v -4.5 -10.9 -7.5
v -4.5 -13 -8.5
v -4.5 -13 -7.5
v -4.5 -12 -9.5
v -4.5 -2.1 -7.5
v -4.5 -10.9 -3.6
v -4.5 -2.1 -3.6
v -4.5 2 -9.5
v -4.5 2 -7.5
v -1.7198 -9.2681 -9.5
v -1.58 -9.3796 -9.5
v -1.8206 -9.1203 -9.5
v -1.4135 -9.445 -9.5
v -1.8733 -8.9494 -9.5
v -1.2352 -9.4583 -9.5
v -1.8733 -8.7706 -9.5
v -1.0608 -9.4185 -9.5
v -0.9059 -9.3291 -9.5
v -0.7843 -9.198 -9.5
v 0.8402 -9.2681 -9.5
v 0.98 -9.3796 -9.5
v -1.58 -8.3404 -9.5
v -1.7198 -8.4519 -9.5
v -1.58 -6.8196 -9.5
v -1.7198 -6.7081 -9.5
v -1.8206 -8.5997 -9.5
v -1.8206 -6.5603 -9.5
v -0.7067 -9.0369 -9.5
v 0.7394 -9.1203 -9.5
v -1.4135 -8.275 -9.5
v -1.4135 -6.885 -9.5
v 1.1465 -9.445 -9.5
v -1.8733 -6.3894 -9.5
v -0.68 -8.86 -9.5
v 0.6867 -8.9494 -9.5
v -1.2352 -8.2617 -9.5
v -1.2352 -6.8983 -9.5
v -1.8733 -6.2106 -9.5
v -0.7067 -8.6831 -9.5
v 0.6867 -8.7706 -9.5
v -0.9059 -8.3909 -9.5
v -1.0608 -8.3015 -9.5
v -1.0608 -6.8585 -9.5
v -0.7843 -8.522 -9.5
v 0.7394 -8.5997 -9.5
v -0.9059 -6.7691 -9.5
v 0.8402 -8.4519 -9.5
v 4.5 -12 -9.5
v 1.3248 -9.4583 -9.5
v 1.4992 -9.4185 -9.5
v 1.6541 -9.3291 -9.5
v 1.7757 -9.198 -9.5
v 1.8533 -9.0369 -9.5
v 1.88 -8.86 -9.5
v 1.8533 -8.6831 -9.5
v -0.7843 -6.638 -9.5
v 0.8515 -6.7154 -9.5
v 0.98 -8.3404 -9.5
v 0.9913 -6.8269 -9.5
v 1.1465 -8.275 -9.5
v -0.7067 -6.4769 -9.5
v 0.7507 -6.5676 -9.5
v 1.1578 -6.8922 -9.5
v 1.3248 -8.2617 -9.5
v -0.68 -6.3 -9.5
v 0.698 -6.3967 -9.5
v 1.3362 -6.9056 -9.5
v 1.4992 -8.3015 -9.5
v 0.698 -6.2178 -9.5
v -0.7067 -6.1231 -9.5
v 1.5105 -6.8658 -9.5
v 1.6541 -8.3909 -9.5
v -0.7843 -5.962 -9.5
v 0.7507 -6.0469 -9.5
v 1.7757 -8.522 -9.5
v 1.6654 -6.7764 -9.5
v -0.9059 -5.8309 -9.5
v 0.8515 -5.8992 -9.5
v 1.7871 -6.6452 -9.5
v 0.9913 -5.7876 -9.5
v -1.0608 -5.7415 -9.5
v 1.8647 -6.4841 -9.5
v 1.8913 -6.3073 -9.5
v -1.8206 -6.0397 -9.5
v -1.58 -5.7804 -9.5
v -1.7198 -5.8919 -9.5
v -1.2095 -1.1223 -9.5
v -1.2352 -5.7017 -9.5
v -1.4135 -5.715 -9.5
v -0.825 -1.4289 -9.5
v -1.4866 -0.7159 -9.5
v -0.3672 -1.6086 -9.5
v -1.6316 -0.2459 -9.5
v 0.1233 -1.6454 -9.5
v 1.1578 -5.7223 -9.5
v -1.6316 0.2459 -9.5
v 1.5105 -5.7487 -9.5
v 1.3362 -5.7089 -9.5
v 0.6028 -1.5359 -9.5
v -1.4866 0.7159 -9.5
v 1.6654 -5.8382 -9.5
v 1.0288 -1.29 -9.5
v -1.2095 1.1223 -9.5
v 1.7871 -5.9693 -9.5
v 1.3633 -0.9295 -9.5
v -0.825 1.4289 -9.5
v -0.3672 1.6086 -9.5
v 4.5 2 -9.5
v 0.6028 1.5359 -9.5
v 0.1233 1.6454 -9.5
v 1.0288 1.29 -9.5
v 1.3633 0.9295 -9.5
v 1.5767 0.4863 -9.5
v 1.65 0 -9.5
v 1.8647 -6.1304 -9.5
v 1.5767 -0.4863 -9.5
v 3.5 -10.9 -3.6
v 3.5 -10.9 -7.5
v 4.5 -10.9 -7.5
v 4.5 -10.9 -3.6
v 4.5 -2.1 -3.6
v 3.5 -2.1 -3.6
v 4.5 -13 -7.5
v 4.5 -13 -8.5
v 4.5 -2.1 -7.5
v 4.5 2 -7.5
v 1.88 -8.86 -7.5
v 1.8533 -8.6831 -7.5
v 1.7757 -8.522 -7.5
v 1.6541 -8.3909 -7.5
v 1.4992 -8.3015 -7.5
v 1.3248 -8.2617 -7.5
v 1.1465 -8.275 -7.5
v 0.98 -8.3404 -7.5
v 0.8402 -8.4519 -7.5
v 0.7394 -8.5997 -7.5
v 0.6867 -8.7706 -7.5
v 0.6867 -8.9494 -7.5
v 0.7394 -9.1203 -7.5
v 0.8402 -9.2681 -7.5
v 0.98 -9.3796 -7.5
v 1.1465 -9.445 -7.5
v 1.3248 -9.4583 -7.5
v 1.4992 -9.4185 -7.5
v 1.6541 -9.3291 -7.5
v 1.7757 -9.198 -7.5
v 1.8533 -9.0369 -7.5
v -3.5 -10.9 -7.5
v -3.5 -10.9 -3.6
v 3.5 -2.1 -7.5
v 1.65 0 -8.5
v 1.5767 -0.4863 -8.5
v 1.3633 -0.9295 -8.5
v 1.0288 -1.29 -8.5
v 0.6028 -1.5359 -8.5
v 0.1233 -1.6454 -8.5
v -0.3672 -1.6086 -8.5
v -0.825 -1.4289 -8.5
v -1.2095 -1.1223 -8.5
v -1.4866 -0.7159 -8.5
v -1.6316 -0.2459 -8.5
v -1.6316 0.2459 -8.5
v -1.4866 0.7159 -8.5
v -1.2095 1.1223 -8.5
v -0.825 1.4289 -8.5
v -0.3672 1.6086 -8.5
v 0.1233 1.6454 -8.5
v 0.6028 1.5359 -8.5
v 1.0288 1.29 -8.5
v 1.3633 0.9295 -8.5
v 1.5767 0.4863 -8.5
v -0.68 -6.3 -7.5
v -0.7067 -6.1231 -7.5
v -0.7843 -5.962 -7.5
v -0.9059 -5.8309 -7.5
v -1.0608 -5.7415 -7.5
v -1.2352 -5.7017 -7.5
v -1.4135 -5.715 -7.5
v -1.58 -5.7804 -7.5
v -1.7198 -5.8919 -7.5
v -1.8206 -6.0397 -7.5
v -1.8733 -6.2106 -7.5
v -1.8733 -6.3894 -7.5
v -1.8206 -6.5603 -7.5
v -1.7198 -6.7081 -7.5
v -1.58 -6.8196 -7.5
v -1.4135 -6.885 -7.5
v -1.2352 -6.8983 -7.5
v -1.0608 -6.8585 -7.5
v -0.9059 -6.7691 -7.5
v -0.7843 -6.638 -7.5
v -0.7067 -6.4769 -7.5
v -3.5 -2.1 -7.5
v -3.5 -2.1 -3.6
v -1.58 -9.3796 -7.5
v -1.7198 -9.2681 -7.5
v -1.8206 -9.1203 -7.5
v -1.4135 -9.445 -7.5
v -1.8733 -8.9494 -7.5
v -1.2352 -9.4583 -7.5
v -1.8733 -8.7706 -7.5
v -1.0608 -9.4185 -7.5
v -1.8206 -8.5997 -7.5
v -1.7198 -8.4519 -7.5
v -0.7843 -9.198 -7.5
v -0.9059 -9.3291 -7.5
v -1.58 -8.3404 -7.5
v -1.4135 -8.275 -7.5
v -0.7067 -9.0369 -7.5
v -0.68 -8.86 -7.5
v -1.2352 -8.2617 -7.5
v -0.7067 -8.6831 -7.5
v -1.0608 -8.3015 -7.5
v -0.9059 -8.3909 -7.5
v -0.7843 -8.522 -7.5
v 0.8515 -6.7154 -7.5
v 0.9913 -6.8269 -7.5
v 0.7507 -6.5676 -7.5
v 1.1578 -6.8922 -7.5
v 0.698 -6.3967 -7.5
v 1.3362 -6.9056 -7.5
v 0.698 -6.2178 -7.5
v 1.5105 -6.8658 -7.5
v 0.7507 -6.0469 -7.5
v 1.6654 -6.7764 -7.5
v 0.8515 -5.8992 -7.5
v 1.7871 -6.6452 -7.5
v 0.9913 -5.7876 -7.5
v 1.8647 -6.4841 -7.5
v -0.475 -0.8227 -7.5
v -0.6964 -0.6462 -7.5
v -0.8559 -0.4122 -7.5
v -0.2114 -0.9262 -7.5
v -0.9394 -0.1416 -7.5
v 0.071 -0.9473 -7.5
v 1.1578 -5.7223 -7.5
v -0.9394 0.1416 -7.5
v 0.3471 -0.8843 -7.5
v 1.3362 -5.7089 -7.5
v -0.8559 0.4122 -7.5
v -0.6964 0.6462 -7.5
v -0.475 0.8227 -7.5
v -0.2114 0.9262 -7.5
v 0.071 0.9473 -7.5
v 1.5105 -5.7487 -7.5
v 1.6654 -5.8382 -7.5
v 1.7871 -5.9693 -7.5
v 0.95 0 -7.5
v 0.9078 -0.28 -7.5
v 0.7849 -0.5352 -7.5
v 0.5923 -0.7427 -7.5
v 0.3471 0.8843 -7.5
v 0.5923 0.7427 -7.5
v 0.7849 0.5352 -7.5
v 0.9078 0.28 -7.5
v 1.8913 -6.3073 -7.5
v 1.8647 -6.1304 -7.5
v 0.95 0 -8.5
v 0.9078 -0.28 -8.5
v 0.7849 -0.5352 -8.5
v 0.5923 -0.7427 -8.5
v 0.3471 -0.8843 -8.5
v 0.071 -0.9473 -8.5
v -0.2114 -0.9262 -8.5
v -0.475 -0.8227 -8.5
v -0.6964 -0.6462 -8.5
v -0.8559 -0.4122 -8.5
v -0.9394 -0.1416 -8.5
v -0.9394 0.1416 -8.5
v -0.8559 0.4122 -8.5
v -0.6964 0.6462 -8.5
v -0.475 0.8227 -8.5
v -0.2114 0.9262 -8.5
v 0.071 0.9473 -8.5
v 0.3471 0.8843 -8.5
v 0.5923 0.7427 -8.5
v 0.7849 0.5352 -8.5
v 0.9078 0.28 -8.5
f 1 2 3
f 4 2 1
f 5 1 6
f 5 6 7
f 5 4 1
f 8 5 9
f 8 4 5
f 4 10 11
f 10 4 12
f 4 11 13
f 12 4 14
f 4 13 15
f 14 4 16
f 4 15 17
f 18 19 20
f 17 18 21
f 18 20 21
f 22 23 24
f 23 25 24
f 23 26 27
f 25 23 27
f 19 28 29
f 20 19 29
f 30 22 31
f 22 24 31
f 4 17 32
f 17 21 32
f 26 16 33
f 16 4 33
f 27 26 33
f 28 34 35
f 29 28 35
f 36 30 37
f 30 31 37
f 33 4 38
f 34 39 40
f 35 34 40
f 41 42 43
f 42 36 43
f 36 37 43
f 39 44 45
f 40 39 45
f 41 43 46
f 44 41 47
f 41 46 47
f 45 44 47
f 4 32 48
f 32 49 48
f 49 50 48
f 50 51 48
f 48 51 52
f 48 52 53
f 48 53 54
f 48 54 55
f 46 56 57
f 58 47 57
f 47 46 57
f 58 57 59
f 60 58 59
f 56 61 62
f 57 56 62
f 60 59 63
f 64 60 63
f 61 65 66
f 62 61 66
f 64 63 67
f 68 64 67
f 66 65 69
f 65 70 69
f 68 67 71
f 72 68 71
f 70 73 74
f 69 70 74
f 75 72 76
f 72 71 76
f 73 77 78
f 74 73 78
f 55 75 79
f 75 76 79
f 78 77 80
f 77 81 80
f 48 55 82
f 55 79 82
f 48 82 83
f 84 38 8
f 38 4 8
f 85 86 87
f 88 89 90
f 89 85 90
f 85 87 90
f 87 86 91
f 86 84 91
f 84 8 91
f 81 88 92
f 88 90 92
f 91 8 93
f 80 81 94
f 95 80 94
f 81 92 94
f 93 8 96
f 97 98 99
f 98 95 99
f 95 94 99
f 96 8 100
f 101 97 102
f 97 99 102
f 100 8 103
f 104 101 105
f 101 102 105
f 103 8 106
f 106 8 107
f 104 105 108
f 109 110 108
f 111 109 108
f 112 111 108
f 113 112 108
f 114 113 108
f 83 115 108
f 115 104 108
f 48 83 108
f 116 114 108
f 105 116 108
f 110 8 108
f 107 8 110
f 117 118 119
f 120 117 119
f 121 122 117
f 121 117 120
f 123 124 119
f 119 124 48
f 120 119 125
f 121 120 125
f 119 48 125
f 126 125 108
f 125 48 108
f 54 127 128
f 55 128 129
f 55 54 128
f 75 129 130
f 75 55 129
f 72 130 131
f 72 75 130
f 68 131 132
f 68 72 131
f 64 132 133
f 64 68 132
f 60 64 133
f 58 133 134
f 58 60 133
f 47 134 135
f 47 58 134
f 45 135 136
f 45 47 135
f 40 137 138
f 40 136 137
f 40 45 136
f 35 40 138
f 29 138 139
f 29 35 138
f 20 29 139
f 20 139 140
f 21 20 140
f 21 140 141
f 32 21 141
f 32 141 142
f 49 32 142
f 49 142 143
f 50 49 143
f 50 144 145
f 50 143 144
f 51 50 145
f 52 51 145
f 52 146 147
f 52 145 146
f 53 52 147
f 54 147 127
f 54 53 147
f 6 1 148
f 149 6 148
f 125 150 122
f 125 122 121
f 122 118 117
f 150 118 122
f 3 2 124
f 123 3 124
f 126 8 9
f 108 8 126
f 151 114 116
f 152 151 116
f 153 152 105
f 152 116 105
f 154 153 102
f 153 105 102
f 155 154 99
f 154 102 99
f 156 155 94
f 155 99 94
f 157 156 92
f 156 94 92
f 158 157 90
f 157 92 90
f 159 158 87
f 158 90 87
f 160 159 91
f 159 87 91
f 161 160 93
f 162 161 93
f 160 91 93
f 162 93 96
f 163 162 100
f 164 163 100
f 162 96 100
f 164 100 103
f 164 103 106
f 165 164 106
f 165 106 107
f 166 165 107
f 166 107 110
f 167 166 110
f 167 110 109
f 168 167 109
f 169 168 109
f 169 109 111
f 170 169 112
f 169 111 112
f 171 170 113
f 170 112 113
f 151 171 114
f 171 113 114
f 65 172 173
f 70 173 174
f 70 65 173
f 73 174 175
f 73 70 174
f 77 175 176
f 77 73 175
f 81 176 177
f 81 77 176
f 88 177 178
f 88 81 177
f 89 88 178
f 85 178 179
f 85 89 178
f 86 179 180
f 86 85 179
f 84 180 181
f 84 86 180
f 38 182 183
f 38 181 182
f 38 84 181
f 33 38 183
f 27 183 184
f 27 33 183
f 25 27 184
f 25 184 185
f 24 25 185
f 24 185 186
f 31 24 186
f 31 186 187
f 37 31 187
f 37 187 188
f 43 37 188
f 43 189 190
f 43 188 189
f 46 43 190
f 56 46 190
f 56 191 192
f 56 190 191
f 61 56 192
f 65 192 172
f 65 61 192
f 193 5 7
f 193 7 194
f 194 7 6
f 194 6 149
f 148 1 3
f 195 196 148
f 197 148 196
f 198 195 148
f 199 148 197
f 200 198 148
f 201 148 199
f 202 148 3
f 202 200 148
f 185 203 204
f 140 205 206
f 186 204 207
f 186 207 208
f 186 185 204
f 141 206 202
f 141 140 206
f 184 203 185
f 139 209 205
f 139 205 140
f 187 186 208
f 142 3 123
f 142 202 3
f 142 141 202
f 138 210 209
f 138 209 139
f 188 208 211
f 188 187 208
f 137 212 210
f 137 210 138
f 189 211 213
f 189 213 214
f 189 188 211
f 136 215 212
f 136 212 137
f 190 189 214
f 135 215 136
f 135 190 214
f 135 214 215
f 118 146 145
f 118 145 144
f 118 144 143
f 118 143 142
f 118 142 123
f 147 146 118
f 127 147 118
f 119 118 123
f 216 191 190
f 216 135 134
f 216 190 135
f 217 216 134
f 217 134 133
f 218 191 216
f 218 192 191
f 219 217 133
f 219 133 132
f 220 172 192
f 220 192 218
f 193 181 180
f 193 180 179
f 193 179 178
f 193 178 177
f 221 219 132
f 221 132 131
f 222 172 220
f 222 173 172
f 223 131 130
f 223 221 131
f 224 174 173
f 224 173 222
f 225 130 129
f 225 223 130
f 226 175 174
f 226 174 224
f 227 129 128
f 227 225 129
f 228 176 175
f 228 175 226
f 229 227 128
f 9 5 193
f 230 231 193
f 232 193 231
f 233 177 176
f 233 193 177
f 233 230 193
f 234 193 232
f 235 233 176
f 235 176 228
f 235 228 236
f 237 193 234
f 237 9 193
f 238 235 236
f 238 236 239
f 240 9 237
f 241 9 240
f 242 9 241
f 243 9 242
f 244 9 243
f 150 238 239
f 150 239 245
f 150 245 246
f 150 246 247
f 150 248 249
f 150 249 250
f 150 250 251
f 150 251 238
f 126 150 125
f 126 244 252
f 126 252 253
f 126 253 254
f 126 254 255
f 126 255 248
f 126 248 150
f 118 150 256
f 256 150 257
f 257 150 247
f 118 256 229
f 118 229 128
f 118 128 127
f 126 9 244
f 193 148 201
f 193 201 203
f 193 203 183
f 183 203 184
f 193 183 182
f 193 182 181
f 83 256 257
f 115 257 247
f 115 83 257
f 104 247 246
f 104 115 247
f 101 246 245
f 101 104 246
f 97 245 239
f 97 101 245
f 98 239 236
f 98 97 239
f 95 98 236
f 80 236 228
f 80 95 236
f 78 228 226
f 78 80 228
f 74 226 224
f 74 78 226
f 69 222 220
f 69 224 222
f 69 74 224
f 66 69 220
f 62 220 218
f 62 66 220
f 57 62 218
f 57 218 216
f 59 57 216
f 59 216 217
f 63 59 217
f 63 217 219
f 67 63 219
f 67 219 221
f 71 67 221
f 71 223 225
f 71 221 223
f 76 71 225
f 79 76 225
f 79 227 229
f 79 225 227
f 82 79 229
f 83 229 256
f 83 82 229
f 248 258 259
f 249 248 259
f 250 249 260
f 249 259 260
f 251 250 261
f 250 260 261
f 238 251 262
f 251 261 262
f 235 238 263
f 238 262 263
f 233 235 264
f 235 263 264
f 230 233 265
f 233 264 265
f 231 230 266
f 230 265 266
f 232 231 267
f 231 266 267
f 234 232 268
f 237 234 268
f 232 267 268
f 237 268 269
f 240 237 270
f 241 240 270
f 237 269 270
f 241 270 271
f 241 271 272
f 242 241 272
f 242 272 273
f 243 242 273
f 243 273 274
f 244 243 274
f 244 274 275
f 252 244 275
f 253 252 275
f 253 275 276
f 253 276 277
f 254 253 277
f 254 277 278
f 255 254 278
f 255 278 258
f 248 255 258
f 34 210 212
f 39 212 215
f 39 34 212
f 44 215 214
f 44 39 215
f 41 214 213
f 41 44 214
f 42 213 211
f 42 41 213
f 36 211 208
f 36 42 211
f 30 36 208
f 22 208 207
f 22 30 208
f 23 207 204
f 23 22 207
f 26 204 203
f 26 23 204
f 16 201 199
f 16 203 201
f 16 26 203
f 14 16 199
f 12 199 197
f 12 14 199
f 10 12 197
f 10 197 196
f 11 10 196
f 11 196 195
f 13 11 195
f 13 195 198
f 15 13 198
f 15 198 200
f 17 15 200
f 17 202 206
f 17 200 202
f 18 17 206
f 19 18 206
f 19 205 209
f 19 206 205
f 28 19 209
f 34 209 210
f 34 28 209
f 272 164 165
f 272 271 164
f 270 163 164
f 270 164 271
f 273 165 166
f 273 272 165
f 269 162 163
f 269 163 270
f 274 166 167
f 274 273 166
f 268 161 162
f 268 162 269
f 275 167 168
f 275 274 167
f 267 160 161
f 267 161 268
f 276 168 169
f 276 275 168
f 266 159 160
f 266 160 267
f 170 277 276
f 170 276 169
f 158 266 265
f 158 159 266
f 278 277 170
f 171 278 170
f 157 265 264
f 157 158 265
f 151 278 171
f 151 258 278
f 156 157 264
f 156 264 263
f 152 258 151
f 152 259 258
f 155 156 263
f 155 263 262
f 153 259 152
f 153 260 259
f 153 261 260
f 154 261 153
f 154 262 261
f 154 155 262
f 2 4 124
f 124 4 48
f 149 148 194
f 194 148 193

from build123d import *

# Parameters (mm, degrees)
SKETCH014_W     = 9
SKETCH014_H     = 15
PAD004_DEPTH    = 2
SKETCH015_R     = 1.65
POCKET009_DEPTH = 1
SKETCH016_R     = 0.95
POCKET010_DEPTH = 5
SKETCH017_W     = 1
SKETCH017_H     = 8.8
PAD005_DEPTH    = 3.9
SKETCH018_R     = 0.6
POCKET011_DEPTH = 5
CHAMFER_SIZE    = 1


with BuildPart() as part:
    # Sketch014 → Pad004 (new body)
    with BuildSketch(Plane.XY):
        with Locations((0, -5.5)):
            Rectangle(SKETCH014_W, SKETCH014_H)
    extrude(amount=PAD004_DEPTH)

    # Sketch015 (on Face18 of Pad003) → Pocket009 (cut)
    with BuildSketch(Plane(origin=(0, 0, 0), x_dir=(1, 0, 0), z_dir=(0, 0, -1))):
        Circle(SKETCH015_R)
    extrude(amount=-POCKET009_DEPTH, mode=Mode.SUBTRACT)

    # Sketch016 (on Face18 of Pad003) → Pocket010 (cut)
    with BuildSketch(Plane(origin=(0, 0, 0.5), x_dir=(1, 0, 0), z_dir=(0, 0, -1))):
        Circle(SKETCH016_R)
    extrude(amount=-POCKET010_DEPTH, mode=Mode.SUBTRACT)

    # Sketch017 → Pad005 (join)
    with BuildSketch(Plane.XY.offset(2)):
        with Locations((-4, -6.5)):
            Rectangle(SKETCH017_W, SKETCH017_H)
        with Locations((4, -6.5)):
            Rectangle(SKETCH017_W, SKETCH017_H)
    extrude(amount=PAD005_DEPTH)

    # Sketch018 → Pocket011 (cut)
    with BuildSketch(Plane(origin=(0, -7.58, 0), x_dir=(1, 0, 0), z_dir=(0, 0, 1))):
        with Locations((-1.28, 1.28)):
            Circle(SKETCH018_R)
        with Locations((1.291315, 1.272746)):
            Circle(SKETCH018_R)
        with Locations((-1.28, -1.28)):
            Circle(SKETCH018_R)
        with Locations((1.28, -1.28)):
            Circle(SKETCH018_R)
    extrude(amount=POCKET011_DEPTH, mode=Mode.SUBTRACT)

    # Chamfer
    chamfer_edges = [part.edges().sort_by_distance(p)[0] for p in [
        (0, -13, 0),
    ]]
    chamfer(chamfer_edges, length=CHAMFER_SIZE)


with BuildPart() as part_1:
    # Body002 placement: moved
    add(part.part.moved(Location((0, 0, -9.5))))


solid = part_1.part
